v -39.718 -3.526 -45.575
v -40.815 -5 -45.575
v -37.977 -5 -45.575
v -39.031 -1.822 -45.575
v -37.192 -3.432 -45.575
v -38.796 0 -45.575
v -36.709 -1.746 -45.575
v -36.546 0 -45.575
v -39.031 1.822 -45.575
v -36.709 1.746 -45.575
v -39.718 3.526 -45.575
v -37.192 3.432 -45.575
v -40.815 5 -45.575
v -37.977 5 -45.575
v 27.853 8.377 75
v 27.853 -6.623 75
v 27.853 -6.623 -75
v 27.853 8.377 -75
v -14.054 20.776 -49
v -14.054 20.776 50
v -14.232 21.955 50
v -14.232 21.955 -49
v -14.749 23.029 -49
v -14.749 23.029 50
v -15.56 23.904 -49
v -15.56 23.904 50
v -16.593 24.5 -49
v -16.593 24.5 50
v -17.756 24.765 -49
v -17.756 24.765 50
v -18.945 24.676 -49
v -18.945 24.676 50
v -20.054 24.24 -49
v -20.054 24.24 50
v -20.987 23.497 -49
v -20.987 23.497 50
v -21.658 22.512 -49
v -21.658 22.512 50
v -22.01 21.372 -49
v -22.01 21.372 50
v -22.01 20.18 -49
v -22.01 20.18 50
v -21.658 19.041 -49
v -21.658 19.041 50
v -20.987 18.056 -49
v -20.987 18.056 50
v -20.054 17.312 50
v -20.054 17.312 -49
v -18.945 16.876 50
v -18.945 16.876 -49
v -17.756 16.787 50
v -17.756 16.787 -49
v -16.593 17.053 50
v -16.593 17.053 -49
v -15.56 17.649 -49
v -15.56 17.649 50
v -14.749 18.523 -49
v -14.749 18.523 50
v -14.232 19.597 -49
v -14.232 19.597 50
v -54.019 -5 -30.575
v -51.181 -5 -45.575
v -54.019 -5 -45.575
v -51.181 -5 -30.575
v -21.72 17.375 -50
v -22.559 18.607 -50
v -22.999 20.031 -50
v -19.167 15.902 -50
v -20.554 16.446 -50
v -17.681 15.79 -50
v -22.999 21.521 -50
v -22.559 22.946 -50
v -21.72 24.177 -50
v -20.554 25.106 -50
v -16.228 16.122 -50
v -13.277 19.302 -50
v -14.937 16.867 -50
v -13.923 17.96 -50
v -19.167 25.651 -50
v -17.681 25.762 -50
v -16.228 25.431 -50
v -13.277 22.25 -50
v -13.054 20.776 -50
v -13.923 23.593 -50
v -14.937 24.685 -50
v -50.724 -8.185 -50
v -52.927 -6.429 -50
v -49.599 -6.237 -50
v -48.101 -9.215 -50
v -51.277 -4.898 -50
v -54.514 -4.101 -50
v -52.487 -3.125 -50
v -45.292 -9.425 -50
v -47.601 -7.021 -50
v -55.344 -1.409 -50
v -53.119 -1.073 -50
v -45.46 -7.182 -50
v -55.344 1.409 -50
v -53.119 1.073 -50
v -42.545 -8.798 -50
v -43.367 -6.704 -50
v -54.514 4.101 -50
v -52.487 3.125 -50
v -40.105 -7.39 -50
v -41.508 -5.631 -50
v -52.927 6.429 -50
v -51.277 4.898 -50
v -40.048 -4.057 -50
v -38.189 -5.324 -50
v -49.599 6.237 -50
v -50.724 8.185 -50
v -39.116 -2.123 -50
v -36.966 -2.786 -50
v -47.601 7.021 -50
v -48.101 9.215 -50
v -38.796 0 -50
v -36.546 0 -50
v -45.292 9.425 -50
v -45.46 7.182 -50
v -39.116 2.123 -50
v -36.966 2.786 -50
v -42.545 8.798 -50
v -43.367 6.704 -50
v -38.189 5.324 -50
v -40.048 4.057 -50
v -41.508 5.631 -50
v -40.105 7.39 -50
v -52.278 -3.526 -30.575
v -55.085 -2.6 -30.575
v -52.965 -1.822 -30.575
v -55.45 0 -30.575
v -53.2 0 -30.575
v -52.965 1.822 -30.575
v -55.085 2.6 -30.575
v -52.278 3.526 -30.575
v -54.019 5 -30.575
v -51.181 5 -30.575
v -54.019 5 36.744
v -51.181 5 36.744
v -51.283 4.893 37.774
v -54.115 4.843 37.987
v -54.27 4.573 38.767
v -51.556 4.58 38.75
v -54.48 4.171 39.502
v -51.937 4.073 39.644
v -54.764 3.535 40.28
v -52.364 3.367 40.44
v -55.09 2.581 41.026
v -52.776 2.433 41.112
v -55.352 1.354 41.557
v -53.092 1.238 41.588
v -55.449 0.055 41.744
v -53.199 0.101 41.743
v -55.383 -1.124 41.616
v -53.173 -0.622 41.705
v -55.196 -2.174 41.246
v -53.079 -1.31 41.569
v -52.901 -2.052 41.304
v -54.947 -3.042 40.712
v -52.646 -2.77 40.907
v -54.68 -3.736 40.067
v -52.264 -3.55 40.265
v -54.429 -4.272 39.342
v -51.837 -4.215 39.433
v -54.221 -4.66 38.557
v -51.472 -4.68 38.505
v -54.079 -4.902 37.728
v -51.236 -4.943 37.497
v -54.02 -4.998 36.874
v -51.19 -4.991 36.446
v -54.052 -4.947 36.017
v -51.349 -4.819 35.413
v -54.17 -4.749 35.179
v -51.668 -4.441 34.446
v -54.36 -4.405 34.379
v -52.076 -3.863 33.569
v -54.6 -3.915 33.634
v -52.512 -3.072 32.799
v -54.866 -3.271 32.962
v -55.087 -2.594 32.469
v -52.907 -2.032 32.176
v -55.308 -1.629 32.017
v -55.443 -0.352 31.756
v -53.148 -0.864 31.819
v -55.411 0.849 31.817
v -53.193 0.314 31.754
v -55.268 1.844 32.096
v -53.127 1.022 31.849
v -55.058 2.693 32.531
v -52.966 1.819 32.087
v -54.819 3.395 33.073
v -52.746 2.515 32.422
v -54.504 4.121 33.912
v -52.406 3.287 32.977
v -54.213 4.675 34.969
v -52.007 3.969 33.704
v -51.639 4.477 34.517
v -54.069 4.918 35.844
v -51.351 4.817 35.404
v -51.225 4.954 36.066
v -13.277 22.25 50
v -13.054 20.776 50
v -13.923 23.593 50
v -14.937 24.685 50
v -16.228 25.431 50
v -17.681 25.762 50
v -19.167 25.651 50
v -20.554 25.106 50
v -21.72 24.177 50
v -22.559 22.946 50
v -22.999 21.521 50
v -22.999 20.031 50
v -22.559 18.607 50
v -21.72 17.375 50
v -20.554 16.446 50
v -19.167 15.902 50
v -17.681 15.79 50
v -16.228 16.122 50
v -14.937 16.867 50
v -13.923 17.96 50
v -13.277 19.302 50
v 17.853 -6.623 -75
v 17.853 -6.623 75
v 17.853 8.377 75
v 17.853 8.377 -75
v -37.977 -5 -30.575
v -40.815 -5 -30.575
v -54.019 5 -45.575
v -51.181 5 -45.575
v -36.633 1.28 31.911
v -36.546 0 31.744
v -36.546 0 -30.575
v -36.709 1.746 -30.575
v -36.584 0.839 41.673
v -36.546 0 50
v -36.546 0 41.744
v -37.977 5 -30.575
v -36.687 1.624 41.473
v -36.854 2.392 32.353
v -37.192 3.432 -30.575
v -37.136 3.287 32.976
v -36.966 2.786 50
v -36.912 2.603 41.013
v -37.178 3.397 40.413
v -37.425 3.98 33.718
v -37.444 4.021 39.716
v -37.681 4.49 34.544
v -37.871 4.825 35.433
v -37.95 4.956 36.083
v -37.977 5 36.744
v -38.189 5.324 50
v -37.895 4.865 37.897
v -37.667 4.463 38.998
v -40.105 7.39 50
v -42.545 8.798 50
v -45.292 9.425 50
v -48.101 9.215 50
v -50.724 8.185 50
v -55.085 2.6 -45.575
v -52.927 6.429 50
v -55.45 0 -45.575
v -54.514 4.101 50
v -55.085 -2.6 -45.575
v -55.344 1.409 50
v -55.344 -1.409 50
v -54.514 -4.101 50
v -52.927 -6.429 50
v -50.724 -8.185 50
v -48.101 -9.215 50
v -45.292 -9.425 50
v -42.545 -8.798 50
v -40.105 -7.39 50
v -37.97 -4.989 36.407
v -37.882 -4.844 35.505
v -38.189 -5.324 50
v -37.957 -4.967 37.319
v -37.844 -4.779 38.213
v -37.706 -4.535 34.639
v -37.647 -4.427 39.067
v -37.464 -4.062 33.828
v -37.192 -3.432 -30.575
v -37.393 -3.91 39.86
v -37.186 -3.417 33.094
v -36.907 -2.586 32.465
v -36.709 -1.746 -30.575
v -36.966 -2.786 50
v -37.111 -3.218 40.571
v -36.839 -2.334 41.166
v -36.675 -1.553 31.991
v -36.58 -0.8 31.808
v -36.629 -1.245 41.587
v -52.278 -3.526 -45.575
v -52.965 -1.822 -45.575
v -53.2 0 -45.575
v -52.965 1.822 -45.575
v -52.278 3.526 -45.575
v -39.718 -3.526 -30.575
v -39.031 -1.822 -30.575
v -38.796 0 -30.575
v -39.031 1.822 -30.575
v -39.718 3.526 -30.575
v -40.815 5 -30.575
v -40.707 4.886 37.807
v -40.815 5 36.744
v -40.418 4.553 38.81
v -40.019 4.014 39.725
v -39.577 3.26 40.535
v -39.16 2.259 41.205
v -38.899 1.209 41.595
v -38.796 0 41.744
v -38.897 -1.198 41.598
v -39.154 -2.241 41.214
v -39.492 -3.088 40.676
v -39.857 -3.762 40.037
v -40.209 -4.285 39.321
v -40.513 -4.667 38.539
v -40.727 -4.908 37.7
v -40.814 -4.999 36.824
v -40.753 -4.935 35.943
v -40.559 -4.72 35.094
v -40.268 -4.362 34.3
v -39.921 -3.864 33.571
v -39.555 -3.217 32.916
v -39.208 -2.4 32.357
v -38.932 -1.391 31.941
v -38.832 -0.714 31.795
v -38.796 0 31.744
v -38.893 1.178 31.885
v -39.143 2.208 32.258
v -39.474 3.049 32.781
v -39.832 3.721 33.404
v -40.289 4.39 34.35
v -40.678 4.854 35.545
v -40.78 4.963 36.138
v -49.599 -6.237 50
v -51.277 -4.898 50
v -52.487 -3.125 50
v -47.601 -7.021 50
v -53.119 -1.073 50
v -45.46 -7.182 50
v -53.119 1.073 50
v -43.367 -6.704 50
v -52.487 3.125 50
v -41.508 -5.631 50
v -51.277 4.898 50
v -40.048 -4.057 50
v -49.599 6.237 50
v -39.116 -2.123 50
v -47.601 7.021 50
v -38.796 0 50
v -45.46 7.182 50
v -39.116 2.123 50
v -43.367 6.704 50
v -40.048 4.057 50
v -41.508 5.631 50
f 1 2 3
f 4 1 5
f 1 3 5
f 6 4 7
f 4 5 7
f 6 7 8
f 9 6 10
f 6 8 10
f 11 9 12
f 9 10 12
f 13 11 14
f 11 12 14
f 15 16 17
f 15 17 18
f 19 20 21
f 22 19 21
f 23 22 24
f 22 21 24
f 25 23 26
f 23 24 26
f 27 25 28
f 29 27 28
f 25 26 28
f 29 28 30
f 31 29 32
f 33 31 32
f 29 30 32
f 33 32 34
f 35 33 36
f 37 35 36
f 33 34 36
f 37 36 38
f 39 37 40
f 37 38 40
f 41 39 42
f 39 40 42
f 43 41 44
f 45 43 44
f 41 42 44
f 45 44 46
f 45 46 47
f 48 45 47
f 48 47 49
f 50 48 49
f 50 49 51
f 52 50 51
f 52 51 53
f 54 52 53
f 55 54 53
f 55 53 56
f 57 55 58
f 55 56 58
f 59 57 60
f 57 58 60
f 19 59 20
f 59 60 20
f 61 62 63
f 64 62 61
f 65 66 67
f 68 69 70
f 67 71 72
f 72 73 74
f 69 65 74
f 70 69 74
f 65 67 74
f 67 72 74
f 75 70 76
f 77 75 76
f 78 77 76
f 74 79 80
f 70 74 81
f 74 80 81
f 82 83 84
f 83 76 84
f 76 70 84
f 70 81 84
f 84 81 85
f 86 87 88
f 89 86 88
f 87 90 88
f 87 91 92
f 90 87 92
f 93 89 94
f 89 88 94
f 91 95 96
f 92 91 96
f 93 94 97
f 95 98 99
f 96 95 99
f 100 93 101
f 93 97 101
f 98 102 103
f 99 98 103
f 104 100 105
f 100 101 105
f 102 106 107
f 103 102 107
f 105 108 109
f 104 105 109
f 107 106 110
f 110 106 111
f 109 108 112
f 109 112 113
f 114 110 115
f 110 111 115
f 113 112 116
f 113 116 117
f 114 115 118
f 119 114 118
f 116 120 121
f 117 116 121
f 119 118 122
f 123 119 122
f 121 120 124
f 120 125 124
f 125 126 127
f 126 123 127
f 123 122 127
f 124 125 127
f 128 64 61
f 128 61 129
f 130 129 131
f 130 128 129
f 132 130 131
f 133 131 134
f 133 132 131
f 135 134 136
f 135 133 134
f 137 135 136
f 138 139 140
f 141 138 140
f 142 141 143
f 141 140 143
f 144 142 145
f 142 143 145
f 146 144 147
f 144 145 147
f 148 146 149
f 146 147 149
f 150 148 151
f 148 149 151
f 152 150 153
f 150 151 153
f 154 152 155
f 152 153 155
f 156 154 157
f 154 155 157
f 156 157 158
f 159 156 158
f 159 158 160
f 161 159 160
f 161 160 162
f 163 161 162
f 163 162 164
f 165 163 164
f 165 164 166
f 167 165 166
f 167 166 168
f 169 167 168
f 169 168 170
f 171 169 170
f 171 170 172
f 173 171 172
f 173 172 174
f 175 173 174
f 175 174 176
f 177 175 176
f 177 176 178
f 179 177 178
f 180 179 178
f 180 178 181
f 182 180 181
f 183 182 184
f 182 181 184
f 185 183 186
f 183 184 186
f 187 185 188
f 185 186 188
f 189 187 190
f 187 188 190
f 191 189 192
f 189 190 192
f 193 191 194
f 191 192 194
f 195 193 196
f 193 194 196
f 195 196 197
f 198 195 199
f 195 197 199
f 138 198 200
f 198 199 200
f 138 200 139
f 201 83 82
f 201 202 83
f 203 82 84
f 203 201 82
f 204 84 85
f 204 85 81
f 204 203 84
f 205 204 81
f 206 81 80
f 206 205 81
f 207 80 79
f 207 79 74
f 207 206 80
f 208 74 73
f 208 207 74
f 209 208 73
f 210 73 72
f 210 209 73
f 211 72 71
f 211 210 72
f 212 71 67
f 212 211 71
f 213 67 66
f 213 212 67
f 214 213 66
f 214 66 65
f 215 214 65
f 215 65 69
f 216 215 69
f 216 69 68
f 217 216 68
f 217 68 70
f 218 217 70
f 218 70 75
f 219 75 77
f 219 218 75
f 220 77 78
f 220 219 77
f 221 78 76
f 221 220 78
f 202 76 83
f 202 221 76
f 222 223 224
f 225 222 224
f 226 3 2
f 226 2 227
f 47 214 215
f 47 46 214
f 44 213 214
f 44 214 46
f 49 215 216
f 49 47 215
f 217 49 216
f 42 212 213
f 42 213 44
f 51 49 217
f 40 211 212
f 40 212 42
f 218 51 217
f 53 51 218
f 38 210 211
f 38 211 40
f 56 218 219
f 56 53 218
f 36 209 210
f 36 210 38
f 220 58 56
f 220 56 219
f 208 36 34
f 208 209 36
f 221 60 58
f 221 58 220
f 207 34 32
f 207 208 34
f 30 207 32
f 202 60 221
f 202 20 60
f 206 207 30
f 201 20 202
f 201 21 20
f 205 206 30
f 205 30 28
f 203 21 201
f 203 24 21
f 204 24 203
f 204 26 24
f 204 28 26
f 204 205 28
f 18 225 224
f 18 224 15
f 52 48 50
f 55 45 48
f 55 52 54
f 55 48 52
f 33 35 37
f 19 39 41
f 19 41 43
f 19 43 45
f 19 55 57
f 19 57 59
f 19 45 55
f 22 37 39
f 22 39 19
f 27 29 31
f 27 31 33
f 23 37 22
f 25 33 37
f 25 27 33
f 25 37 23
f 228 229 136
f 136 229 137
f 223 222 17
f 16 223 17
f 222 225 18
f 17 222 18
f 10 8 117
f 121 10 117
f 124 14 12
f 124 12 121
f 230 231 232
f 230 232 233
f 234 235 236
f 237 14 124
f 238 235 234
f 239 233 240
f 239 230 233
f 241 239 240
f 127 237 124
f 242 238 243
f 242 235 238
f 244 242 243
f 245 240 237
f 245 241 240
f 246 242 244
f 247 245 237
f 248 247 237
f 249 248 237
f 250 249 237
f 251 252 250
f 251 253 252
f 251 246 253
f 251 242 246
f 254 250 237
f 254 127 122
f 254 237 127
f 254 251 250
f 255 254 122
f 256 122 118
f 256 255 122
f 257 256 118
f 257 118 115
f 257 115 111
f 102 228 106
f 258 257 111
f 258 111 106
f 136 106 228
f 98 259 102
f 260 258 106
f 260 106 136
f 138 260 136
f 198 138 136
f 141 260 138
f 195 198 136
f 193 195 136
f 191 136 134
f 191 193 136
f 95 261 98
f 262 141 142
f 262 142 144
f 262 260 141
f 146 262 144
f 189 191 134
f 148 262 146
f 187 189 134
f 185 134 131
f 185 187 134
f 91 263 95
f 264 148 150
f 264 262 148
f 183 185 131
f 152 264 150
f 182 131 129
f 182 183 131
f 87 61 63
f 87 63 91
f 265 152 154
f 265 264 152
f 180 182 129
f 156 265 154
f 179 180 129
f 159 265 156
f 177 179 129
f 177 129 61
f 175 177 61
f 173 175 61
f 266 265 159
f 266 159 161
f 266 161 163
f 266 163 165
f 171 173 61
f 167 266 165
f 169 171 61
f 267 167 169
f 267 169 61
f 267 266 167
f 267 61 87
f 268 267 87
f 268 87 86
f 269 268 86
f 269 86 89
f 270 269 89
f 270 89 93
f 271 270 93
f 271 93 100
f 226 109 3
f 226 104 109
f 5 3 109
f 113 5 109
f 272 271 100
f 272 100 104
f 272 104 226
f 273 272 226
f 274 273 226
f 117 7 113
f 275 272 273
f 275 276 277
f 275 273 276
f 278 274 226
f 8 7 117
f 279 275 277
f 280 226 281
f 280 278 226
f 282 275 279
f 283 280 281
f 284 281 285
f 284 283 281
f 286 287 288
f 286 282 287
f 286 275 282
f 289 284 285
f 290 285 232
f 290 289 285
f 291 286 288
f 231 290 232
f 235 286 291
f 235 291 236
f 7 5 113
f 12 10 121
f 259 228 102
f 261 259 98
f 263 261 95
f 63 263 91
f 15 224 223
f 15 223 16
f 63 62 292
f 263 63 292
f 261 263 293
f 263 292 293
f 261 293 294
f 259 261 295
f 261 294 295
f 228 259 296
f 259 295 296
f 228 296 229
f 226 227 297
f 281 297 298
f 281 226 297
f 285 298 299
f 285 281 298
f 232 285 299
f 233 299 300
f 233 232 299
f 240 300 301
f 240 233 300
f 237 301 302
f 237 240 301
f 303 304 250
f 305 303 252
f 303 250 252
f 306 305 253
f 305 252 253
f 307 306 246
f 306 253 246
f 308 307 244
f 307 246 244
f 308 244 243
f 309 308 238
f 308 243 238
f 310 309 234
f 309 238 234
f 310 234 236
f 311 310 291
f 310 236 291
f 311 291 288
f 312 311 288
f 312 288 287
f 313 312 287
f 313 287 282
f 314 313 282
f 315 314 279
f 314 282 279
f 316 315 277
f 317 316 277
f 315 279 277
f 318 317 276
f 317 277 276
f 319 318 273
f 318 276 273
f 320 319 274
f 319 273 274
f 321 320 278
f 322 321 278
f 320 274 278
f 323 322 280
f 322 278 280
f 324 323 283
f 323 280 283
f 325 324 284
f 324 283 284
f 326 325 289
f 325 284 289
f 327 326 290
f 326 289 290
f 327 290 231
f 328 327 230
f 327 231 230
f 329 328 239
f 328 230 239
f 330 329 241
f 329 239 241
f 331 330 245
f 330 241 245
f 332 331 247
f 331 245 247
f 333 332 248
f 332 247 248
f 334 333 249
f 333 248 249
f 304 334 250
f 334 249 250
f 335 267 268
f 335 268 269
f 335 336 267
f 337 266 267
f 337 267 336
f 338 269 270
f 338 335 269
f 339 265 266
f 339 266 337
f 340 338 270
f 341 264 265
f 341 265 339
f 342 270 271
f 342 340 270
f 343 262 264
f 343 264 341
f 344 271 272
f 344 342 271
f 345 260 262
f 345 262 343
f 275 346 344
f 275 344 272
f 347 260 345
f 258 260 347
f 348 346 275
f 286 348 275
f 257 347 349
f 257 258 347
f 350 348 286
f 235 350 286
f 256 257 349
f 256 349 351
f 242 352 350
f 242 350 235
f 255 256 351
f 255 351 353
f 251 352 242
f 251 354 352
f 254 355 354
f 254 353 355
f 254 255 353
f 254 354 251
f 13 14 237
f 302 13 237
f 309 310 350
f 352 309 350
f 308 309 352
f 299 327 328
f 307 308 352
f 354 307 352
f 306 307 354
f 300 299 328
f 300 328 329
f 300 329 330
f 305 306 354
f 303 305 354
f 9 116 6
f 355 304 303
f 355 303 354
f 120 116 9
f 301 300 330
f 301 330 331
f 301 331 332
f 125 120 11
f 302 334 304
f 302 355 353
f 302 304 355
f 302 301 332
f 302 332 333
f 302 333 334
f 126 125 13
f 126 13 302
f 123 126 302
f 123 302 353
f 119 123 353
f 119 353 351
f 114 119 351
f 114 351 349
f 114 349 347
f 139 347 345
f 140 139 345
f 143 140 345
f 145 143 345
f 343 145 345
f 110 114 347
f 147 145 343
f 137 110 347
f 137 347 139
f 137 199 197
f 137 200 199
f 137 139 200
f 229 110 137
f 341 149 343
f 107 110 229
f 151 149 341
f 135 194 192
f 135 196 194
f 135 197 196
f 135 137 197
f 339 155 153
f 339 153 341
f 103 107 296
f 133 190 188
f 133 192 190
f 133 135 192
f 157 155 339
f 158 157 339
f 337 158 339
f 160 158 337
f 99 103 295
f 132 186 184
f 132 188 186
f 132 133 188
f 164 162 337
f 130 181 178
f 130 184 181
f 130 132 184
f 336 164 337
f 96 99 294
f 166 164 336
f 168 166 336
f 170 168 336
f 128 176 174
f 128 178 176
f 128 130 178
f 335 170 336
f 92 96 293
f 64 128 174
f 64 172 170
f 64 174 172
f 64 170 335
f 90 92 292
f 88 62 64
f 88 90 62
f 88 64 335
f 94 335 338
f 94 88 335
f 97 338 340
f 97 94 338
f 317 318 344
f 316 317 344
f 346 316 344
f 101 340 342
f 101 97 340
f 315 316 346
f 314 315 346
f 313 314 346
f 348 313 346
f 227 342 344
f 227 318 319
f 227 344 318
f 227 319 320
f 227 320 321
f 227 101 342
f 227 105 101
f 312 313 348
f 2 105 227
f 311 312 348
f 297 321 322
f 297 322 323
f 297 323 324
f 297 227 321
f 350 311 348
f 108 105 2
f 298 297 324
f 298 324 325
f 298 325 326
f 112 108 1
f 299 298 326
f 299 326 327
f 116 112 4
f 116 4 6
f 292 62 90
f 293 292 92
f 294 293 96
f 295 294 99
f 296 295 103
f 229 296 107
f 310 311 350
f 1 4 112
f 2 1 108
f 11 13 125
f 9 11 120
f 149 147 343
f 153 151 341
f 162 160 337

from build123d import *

# Parameters (mm, degrees)
F0_R     = 9.45161
F0_R_2   = 7.20171
F1_DEPTH = 50
F2_R     = 5
F2_W     = 10
F2_H     = 15
F3_DEPTH = 250
F4_R     = 5
F5_DEPTH = 50
F6_T     = -1
F7_W     = 10
F7_H     = 15
F8_DEPTH = 75


with BuildPart() as f1:
    # F0 (on Top) → F1 (new body, symmetric)
    with BuildSketch(Plane.XY):
        with Locations((-45.997985, 0)):
            Circle(F0_R)
        with Locations((-45.997985, 0)):
            Circle(F0_R_2, mode=Mode.SUBTRACT)
    extrude(amount=F1_DEPTH, both=True)

    # F2 (on Right) → F3 (cut, symmetric)
    with BuildSketch(Plane.YZ):
        with Locations((0, 36.743954)):
            Circle(F2_R)
        with Locations((0, -38.074599)):
            Rectangle(F2_W, F2_H)
    extrude(amount=F3_DEPTH, both=True, mode=Mode.SUBTRACT)


with BuildPart() as f5:
    # F4 (on Top) → F5 (new body, symmetric)
    with BuildSketch(Plane.XY):
        with Locations((-18.054435, 20.77621)):
            Circle(F4_R)
    extrude(amount=F5_DEPTH, both=True)

    # F6
    f6_openings = [f5.faces().sort_by_distance(p)[0] for p in [
        (-18.054435, 20.77621, 50),
    ]]
    offset(amount=F6_T, openings=f6_openings)


with BuildPart() as f8:
    # F7 (on Top) → F8 (new body, symmetric)
    with BuildSketch(Plane.XY):
        with Locations((22.852822, 0.877016)):
            Rectangle(F7_W, F7_H)
    extrude(amount=F8_DEPTH, both=True)


solid = Compound([f1.part, f5.part, f8.part])
